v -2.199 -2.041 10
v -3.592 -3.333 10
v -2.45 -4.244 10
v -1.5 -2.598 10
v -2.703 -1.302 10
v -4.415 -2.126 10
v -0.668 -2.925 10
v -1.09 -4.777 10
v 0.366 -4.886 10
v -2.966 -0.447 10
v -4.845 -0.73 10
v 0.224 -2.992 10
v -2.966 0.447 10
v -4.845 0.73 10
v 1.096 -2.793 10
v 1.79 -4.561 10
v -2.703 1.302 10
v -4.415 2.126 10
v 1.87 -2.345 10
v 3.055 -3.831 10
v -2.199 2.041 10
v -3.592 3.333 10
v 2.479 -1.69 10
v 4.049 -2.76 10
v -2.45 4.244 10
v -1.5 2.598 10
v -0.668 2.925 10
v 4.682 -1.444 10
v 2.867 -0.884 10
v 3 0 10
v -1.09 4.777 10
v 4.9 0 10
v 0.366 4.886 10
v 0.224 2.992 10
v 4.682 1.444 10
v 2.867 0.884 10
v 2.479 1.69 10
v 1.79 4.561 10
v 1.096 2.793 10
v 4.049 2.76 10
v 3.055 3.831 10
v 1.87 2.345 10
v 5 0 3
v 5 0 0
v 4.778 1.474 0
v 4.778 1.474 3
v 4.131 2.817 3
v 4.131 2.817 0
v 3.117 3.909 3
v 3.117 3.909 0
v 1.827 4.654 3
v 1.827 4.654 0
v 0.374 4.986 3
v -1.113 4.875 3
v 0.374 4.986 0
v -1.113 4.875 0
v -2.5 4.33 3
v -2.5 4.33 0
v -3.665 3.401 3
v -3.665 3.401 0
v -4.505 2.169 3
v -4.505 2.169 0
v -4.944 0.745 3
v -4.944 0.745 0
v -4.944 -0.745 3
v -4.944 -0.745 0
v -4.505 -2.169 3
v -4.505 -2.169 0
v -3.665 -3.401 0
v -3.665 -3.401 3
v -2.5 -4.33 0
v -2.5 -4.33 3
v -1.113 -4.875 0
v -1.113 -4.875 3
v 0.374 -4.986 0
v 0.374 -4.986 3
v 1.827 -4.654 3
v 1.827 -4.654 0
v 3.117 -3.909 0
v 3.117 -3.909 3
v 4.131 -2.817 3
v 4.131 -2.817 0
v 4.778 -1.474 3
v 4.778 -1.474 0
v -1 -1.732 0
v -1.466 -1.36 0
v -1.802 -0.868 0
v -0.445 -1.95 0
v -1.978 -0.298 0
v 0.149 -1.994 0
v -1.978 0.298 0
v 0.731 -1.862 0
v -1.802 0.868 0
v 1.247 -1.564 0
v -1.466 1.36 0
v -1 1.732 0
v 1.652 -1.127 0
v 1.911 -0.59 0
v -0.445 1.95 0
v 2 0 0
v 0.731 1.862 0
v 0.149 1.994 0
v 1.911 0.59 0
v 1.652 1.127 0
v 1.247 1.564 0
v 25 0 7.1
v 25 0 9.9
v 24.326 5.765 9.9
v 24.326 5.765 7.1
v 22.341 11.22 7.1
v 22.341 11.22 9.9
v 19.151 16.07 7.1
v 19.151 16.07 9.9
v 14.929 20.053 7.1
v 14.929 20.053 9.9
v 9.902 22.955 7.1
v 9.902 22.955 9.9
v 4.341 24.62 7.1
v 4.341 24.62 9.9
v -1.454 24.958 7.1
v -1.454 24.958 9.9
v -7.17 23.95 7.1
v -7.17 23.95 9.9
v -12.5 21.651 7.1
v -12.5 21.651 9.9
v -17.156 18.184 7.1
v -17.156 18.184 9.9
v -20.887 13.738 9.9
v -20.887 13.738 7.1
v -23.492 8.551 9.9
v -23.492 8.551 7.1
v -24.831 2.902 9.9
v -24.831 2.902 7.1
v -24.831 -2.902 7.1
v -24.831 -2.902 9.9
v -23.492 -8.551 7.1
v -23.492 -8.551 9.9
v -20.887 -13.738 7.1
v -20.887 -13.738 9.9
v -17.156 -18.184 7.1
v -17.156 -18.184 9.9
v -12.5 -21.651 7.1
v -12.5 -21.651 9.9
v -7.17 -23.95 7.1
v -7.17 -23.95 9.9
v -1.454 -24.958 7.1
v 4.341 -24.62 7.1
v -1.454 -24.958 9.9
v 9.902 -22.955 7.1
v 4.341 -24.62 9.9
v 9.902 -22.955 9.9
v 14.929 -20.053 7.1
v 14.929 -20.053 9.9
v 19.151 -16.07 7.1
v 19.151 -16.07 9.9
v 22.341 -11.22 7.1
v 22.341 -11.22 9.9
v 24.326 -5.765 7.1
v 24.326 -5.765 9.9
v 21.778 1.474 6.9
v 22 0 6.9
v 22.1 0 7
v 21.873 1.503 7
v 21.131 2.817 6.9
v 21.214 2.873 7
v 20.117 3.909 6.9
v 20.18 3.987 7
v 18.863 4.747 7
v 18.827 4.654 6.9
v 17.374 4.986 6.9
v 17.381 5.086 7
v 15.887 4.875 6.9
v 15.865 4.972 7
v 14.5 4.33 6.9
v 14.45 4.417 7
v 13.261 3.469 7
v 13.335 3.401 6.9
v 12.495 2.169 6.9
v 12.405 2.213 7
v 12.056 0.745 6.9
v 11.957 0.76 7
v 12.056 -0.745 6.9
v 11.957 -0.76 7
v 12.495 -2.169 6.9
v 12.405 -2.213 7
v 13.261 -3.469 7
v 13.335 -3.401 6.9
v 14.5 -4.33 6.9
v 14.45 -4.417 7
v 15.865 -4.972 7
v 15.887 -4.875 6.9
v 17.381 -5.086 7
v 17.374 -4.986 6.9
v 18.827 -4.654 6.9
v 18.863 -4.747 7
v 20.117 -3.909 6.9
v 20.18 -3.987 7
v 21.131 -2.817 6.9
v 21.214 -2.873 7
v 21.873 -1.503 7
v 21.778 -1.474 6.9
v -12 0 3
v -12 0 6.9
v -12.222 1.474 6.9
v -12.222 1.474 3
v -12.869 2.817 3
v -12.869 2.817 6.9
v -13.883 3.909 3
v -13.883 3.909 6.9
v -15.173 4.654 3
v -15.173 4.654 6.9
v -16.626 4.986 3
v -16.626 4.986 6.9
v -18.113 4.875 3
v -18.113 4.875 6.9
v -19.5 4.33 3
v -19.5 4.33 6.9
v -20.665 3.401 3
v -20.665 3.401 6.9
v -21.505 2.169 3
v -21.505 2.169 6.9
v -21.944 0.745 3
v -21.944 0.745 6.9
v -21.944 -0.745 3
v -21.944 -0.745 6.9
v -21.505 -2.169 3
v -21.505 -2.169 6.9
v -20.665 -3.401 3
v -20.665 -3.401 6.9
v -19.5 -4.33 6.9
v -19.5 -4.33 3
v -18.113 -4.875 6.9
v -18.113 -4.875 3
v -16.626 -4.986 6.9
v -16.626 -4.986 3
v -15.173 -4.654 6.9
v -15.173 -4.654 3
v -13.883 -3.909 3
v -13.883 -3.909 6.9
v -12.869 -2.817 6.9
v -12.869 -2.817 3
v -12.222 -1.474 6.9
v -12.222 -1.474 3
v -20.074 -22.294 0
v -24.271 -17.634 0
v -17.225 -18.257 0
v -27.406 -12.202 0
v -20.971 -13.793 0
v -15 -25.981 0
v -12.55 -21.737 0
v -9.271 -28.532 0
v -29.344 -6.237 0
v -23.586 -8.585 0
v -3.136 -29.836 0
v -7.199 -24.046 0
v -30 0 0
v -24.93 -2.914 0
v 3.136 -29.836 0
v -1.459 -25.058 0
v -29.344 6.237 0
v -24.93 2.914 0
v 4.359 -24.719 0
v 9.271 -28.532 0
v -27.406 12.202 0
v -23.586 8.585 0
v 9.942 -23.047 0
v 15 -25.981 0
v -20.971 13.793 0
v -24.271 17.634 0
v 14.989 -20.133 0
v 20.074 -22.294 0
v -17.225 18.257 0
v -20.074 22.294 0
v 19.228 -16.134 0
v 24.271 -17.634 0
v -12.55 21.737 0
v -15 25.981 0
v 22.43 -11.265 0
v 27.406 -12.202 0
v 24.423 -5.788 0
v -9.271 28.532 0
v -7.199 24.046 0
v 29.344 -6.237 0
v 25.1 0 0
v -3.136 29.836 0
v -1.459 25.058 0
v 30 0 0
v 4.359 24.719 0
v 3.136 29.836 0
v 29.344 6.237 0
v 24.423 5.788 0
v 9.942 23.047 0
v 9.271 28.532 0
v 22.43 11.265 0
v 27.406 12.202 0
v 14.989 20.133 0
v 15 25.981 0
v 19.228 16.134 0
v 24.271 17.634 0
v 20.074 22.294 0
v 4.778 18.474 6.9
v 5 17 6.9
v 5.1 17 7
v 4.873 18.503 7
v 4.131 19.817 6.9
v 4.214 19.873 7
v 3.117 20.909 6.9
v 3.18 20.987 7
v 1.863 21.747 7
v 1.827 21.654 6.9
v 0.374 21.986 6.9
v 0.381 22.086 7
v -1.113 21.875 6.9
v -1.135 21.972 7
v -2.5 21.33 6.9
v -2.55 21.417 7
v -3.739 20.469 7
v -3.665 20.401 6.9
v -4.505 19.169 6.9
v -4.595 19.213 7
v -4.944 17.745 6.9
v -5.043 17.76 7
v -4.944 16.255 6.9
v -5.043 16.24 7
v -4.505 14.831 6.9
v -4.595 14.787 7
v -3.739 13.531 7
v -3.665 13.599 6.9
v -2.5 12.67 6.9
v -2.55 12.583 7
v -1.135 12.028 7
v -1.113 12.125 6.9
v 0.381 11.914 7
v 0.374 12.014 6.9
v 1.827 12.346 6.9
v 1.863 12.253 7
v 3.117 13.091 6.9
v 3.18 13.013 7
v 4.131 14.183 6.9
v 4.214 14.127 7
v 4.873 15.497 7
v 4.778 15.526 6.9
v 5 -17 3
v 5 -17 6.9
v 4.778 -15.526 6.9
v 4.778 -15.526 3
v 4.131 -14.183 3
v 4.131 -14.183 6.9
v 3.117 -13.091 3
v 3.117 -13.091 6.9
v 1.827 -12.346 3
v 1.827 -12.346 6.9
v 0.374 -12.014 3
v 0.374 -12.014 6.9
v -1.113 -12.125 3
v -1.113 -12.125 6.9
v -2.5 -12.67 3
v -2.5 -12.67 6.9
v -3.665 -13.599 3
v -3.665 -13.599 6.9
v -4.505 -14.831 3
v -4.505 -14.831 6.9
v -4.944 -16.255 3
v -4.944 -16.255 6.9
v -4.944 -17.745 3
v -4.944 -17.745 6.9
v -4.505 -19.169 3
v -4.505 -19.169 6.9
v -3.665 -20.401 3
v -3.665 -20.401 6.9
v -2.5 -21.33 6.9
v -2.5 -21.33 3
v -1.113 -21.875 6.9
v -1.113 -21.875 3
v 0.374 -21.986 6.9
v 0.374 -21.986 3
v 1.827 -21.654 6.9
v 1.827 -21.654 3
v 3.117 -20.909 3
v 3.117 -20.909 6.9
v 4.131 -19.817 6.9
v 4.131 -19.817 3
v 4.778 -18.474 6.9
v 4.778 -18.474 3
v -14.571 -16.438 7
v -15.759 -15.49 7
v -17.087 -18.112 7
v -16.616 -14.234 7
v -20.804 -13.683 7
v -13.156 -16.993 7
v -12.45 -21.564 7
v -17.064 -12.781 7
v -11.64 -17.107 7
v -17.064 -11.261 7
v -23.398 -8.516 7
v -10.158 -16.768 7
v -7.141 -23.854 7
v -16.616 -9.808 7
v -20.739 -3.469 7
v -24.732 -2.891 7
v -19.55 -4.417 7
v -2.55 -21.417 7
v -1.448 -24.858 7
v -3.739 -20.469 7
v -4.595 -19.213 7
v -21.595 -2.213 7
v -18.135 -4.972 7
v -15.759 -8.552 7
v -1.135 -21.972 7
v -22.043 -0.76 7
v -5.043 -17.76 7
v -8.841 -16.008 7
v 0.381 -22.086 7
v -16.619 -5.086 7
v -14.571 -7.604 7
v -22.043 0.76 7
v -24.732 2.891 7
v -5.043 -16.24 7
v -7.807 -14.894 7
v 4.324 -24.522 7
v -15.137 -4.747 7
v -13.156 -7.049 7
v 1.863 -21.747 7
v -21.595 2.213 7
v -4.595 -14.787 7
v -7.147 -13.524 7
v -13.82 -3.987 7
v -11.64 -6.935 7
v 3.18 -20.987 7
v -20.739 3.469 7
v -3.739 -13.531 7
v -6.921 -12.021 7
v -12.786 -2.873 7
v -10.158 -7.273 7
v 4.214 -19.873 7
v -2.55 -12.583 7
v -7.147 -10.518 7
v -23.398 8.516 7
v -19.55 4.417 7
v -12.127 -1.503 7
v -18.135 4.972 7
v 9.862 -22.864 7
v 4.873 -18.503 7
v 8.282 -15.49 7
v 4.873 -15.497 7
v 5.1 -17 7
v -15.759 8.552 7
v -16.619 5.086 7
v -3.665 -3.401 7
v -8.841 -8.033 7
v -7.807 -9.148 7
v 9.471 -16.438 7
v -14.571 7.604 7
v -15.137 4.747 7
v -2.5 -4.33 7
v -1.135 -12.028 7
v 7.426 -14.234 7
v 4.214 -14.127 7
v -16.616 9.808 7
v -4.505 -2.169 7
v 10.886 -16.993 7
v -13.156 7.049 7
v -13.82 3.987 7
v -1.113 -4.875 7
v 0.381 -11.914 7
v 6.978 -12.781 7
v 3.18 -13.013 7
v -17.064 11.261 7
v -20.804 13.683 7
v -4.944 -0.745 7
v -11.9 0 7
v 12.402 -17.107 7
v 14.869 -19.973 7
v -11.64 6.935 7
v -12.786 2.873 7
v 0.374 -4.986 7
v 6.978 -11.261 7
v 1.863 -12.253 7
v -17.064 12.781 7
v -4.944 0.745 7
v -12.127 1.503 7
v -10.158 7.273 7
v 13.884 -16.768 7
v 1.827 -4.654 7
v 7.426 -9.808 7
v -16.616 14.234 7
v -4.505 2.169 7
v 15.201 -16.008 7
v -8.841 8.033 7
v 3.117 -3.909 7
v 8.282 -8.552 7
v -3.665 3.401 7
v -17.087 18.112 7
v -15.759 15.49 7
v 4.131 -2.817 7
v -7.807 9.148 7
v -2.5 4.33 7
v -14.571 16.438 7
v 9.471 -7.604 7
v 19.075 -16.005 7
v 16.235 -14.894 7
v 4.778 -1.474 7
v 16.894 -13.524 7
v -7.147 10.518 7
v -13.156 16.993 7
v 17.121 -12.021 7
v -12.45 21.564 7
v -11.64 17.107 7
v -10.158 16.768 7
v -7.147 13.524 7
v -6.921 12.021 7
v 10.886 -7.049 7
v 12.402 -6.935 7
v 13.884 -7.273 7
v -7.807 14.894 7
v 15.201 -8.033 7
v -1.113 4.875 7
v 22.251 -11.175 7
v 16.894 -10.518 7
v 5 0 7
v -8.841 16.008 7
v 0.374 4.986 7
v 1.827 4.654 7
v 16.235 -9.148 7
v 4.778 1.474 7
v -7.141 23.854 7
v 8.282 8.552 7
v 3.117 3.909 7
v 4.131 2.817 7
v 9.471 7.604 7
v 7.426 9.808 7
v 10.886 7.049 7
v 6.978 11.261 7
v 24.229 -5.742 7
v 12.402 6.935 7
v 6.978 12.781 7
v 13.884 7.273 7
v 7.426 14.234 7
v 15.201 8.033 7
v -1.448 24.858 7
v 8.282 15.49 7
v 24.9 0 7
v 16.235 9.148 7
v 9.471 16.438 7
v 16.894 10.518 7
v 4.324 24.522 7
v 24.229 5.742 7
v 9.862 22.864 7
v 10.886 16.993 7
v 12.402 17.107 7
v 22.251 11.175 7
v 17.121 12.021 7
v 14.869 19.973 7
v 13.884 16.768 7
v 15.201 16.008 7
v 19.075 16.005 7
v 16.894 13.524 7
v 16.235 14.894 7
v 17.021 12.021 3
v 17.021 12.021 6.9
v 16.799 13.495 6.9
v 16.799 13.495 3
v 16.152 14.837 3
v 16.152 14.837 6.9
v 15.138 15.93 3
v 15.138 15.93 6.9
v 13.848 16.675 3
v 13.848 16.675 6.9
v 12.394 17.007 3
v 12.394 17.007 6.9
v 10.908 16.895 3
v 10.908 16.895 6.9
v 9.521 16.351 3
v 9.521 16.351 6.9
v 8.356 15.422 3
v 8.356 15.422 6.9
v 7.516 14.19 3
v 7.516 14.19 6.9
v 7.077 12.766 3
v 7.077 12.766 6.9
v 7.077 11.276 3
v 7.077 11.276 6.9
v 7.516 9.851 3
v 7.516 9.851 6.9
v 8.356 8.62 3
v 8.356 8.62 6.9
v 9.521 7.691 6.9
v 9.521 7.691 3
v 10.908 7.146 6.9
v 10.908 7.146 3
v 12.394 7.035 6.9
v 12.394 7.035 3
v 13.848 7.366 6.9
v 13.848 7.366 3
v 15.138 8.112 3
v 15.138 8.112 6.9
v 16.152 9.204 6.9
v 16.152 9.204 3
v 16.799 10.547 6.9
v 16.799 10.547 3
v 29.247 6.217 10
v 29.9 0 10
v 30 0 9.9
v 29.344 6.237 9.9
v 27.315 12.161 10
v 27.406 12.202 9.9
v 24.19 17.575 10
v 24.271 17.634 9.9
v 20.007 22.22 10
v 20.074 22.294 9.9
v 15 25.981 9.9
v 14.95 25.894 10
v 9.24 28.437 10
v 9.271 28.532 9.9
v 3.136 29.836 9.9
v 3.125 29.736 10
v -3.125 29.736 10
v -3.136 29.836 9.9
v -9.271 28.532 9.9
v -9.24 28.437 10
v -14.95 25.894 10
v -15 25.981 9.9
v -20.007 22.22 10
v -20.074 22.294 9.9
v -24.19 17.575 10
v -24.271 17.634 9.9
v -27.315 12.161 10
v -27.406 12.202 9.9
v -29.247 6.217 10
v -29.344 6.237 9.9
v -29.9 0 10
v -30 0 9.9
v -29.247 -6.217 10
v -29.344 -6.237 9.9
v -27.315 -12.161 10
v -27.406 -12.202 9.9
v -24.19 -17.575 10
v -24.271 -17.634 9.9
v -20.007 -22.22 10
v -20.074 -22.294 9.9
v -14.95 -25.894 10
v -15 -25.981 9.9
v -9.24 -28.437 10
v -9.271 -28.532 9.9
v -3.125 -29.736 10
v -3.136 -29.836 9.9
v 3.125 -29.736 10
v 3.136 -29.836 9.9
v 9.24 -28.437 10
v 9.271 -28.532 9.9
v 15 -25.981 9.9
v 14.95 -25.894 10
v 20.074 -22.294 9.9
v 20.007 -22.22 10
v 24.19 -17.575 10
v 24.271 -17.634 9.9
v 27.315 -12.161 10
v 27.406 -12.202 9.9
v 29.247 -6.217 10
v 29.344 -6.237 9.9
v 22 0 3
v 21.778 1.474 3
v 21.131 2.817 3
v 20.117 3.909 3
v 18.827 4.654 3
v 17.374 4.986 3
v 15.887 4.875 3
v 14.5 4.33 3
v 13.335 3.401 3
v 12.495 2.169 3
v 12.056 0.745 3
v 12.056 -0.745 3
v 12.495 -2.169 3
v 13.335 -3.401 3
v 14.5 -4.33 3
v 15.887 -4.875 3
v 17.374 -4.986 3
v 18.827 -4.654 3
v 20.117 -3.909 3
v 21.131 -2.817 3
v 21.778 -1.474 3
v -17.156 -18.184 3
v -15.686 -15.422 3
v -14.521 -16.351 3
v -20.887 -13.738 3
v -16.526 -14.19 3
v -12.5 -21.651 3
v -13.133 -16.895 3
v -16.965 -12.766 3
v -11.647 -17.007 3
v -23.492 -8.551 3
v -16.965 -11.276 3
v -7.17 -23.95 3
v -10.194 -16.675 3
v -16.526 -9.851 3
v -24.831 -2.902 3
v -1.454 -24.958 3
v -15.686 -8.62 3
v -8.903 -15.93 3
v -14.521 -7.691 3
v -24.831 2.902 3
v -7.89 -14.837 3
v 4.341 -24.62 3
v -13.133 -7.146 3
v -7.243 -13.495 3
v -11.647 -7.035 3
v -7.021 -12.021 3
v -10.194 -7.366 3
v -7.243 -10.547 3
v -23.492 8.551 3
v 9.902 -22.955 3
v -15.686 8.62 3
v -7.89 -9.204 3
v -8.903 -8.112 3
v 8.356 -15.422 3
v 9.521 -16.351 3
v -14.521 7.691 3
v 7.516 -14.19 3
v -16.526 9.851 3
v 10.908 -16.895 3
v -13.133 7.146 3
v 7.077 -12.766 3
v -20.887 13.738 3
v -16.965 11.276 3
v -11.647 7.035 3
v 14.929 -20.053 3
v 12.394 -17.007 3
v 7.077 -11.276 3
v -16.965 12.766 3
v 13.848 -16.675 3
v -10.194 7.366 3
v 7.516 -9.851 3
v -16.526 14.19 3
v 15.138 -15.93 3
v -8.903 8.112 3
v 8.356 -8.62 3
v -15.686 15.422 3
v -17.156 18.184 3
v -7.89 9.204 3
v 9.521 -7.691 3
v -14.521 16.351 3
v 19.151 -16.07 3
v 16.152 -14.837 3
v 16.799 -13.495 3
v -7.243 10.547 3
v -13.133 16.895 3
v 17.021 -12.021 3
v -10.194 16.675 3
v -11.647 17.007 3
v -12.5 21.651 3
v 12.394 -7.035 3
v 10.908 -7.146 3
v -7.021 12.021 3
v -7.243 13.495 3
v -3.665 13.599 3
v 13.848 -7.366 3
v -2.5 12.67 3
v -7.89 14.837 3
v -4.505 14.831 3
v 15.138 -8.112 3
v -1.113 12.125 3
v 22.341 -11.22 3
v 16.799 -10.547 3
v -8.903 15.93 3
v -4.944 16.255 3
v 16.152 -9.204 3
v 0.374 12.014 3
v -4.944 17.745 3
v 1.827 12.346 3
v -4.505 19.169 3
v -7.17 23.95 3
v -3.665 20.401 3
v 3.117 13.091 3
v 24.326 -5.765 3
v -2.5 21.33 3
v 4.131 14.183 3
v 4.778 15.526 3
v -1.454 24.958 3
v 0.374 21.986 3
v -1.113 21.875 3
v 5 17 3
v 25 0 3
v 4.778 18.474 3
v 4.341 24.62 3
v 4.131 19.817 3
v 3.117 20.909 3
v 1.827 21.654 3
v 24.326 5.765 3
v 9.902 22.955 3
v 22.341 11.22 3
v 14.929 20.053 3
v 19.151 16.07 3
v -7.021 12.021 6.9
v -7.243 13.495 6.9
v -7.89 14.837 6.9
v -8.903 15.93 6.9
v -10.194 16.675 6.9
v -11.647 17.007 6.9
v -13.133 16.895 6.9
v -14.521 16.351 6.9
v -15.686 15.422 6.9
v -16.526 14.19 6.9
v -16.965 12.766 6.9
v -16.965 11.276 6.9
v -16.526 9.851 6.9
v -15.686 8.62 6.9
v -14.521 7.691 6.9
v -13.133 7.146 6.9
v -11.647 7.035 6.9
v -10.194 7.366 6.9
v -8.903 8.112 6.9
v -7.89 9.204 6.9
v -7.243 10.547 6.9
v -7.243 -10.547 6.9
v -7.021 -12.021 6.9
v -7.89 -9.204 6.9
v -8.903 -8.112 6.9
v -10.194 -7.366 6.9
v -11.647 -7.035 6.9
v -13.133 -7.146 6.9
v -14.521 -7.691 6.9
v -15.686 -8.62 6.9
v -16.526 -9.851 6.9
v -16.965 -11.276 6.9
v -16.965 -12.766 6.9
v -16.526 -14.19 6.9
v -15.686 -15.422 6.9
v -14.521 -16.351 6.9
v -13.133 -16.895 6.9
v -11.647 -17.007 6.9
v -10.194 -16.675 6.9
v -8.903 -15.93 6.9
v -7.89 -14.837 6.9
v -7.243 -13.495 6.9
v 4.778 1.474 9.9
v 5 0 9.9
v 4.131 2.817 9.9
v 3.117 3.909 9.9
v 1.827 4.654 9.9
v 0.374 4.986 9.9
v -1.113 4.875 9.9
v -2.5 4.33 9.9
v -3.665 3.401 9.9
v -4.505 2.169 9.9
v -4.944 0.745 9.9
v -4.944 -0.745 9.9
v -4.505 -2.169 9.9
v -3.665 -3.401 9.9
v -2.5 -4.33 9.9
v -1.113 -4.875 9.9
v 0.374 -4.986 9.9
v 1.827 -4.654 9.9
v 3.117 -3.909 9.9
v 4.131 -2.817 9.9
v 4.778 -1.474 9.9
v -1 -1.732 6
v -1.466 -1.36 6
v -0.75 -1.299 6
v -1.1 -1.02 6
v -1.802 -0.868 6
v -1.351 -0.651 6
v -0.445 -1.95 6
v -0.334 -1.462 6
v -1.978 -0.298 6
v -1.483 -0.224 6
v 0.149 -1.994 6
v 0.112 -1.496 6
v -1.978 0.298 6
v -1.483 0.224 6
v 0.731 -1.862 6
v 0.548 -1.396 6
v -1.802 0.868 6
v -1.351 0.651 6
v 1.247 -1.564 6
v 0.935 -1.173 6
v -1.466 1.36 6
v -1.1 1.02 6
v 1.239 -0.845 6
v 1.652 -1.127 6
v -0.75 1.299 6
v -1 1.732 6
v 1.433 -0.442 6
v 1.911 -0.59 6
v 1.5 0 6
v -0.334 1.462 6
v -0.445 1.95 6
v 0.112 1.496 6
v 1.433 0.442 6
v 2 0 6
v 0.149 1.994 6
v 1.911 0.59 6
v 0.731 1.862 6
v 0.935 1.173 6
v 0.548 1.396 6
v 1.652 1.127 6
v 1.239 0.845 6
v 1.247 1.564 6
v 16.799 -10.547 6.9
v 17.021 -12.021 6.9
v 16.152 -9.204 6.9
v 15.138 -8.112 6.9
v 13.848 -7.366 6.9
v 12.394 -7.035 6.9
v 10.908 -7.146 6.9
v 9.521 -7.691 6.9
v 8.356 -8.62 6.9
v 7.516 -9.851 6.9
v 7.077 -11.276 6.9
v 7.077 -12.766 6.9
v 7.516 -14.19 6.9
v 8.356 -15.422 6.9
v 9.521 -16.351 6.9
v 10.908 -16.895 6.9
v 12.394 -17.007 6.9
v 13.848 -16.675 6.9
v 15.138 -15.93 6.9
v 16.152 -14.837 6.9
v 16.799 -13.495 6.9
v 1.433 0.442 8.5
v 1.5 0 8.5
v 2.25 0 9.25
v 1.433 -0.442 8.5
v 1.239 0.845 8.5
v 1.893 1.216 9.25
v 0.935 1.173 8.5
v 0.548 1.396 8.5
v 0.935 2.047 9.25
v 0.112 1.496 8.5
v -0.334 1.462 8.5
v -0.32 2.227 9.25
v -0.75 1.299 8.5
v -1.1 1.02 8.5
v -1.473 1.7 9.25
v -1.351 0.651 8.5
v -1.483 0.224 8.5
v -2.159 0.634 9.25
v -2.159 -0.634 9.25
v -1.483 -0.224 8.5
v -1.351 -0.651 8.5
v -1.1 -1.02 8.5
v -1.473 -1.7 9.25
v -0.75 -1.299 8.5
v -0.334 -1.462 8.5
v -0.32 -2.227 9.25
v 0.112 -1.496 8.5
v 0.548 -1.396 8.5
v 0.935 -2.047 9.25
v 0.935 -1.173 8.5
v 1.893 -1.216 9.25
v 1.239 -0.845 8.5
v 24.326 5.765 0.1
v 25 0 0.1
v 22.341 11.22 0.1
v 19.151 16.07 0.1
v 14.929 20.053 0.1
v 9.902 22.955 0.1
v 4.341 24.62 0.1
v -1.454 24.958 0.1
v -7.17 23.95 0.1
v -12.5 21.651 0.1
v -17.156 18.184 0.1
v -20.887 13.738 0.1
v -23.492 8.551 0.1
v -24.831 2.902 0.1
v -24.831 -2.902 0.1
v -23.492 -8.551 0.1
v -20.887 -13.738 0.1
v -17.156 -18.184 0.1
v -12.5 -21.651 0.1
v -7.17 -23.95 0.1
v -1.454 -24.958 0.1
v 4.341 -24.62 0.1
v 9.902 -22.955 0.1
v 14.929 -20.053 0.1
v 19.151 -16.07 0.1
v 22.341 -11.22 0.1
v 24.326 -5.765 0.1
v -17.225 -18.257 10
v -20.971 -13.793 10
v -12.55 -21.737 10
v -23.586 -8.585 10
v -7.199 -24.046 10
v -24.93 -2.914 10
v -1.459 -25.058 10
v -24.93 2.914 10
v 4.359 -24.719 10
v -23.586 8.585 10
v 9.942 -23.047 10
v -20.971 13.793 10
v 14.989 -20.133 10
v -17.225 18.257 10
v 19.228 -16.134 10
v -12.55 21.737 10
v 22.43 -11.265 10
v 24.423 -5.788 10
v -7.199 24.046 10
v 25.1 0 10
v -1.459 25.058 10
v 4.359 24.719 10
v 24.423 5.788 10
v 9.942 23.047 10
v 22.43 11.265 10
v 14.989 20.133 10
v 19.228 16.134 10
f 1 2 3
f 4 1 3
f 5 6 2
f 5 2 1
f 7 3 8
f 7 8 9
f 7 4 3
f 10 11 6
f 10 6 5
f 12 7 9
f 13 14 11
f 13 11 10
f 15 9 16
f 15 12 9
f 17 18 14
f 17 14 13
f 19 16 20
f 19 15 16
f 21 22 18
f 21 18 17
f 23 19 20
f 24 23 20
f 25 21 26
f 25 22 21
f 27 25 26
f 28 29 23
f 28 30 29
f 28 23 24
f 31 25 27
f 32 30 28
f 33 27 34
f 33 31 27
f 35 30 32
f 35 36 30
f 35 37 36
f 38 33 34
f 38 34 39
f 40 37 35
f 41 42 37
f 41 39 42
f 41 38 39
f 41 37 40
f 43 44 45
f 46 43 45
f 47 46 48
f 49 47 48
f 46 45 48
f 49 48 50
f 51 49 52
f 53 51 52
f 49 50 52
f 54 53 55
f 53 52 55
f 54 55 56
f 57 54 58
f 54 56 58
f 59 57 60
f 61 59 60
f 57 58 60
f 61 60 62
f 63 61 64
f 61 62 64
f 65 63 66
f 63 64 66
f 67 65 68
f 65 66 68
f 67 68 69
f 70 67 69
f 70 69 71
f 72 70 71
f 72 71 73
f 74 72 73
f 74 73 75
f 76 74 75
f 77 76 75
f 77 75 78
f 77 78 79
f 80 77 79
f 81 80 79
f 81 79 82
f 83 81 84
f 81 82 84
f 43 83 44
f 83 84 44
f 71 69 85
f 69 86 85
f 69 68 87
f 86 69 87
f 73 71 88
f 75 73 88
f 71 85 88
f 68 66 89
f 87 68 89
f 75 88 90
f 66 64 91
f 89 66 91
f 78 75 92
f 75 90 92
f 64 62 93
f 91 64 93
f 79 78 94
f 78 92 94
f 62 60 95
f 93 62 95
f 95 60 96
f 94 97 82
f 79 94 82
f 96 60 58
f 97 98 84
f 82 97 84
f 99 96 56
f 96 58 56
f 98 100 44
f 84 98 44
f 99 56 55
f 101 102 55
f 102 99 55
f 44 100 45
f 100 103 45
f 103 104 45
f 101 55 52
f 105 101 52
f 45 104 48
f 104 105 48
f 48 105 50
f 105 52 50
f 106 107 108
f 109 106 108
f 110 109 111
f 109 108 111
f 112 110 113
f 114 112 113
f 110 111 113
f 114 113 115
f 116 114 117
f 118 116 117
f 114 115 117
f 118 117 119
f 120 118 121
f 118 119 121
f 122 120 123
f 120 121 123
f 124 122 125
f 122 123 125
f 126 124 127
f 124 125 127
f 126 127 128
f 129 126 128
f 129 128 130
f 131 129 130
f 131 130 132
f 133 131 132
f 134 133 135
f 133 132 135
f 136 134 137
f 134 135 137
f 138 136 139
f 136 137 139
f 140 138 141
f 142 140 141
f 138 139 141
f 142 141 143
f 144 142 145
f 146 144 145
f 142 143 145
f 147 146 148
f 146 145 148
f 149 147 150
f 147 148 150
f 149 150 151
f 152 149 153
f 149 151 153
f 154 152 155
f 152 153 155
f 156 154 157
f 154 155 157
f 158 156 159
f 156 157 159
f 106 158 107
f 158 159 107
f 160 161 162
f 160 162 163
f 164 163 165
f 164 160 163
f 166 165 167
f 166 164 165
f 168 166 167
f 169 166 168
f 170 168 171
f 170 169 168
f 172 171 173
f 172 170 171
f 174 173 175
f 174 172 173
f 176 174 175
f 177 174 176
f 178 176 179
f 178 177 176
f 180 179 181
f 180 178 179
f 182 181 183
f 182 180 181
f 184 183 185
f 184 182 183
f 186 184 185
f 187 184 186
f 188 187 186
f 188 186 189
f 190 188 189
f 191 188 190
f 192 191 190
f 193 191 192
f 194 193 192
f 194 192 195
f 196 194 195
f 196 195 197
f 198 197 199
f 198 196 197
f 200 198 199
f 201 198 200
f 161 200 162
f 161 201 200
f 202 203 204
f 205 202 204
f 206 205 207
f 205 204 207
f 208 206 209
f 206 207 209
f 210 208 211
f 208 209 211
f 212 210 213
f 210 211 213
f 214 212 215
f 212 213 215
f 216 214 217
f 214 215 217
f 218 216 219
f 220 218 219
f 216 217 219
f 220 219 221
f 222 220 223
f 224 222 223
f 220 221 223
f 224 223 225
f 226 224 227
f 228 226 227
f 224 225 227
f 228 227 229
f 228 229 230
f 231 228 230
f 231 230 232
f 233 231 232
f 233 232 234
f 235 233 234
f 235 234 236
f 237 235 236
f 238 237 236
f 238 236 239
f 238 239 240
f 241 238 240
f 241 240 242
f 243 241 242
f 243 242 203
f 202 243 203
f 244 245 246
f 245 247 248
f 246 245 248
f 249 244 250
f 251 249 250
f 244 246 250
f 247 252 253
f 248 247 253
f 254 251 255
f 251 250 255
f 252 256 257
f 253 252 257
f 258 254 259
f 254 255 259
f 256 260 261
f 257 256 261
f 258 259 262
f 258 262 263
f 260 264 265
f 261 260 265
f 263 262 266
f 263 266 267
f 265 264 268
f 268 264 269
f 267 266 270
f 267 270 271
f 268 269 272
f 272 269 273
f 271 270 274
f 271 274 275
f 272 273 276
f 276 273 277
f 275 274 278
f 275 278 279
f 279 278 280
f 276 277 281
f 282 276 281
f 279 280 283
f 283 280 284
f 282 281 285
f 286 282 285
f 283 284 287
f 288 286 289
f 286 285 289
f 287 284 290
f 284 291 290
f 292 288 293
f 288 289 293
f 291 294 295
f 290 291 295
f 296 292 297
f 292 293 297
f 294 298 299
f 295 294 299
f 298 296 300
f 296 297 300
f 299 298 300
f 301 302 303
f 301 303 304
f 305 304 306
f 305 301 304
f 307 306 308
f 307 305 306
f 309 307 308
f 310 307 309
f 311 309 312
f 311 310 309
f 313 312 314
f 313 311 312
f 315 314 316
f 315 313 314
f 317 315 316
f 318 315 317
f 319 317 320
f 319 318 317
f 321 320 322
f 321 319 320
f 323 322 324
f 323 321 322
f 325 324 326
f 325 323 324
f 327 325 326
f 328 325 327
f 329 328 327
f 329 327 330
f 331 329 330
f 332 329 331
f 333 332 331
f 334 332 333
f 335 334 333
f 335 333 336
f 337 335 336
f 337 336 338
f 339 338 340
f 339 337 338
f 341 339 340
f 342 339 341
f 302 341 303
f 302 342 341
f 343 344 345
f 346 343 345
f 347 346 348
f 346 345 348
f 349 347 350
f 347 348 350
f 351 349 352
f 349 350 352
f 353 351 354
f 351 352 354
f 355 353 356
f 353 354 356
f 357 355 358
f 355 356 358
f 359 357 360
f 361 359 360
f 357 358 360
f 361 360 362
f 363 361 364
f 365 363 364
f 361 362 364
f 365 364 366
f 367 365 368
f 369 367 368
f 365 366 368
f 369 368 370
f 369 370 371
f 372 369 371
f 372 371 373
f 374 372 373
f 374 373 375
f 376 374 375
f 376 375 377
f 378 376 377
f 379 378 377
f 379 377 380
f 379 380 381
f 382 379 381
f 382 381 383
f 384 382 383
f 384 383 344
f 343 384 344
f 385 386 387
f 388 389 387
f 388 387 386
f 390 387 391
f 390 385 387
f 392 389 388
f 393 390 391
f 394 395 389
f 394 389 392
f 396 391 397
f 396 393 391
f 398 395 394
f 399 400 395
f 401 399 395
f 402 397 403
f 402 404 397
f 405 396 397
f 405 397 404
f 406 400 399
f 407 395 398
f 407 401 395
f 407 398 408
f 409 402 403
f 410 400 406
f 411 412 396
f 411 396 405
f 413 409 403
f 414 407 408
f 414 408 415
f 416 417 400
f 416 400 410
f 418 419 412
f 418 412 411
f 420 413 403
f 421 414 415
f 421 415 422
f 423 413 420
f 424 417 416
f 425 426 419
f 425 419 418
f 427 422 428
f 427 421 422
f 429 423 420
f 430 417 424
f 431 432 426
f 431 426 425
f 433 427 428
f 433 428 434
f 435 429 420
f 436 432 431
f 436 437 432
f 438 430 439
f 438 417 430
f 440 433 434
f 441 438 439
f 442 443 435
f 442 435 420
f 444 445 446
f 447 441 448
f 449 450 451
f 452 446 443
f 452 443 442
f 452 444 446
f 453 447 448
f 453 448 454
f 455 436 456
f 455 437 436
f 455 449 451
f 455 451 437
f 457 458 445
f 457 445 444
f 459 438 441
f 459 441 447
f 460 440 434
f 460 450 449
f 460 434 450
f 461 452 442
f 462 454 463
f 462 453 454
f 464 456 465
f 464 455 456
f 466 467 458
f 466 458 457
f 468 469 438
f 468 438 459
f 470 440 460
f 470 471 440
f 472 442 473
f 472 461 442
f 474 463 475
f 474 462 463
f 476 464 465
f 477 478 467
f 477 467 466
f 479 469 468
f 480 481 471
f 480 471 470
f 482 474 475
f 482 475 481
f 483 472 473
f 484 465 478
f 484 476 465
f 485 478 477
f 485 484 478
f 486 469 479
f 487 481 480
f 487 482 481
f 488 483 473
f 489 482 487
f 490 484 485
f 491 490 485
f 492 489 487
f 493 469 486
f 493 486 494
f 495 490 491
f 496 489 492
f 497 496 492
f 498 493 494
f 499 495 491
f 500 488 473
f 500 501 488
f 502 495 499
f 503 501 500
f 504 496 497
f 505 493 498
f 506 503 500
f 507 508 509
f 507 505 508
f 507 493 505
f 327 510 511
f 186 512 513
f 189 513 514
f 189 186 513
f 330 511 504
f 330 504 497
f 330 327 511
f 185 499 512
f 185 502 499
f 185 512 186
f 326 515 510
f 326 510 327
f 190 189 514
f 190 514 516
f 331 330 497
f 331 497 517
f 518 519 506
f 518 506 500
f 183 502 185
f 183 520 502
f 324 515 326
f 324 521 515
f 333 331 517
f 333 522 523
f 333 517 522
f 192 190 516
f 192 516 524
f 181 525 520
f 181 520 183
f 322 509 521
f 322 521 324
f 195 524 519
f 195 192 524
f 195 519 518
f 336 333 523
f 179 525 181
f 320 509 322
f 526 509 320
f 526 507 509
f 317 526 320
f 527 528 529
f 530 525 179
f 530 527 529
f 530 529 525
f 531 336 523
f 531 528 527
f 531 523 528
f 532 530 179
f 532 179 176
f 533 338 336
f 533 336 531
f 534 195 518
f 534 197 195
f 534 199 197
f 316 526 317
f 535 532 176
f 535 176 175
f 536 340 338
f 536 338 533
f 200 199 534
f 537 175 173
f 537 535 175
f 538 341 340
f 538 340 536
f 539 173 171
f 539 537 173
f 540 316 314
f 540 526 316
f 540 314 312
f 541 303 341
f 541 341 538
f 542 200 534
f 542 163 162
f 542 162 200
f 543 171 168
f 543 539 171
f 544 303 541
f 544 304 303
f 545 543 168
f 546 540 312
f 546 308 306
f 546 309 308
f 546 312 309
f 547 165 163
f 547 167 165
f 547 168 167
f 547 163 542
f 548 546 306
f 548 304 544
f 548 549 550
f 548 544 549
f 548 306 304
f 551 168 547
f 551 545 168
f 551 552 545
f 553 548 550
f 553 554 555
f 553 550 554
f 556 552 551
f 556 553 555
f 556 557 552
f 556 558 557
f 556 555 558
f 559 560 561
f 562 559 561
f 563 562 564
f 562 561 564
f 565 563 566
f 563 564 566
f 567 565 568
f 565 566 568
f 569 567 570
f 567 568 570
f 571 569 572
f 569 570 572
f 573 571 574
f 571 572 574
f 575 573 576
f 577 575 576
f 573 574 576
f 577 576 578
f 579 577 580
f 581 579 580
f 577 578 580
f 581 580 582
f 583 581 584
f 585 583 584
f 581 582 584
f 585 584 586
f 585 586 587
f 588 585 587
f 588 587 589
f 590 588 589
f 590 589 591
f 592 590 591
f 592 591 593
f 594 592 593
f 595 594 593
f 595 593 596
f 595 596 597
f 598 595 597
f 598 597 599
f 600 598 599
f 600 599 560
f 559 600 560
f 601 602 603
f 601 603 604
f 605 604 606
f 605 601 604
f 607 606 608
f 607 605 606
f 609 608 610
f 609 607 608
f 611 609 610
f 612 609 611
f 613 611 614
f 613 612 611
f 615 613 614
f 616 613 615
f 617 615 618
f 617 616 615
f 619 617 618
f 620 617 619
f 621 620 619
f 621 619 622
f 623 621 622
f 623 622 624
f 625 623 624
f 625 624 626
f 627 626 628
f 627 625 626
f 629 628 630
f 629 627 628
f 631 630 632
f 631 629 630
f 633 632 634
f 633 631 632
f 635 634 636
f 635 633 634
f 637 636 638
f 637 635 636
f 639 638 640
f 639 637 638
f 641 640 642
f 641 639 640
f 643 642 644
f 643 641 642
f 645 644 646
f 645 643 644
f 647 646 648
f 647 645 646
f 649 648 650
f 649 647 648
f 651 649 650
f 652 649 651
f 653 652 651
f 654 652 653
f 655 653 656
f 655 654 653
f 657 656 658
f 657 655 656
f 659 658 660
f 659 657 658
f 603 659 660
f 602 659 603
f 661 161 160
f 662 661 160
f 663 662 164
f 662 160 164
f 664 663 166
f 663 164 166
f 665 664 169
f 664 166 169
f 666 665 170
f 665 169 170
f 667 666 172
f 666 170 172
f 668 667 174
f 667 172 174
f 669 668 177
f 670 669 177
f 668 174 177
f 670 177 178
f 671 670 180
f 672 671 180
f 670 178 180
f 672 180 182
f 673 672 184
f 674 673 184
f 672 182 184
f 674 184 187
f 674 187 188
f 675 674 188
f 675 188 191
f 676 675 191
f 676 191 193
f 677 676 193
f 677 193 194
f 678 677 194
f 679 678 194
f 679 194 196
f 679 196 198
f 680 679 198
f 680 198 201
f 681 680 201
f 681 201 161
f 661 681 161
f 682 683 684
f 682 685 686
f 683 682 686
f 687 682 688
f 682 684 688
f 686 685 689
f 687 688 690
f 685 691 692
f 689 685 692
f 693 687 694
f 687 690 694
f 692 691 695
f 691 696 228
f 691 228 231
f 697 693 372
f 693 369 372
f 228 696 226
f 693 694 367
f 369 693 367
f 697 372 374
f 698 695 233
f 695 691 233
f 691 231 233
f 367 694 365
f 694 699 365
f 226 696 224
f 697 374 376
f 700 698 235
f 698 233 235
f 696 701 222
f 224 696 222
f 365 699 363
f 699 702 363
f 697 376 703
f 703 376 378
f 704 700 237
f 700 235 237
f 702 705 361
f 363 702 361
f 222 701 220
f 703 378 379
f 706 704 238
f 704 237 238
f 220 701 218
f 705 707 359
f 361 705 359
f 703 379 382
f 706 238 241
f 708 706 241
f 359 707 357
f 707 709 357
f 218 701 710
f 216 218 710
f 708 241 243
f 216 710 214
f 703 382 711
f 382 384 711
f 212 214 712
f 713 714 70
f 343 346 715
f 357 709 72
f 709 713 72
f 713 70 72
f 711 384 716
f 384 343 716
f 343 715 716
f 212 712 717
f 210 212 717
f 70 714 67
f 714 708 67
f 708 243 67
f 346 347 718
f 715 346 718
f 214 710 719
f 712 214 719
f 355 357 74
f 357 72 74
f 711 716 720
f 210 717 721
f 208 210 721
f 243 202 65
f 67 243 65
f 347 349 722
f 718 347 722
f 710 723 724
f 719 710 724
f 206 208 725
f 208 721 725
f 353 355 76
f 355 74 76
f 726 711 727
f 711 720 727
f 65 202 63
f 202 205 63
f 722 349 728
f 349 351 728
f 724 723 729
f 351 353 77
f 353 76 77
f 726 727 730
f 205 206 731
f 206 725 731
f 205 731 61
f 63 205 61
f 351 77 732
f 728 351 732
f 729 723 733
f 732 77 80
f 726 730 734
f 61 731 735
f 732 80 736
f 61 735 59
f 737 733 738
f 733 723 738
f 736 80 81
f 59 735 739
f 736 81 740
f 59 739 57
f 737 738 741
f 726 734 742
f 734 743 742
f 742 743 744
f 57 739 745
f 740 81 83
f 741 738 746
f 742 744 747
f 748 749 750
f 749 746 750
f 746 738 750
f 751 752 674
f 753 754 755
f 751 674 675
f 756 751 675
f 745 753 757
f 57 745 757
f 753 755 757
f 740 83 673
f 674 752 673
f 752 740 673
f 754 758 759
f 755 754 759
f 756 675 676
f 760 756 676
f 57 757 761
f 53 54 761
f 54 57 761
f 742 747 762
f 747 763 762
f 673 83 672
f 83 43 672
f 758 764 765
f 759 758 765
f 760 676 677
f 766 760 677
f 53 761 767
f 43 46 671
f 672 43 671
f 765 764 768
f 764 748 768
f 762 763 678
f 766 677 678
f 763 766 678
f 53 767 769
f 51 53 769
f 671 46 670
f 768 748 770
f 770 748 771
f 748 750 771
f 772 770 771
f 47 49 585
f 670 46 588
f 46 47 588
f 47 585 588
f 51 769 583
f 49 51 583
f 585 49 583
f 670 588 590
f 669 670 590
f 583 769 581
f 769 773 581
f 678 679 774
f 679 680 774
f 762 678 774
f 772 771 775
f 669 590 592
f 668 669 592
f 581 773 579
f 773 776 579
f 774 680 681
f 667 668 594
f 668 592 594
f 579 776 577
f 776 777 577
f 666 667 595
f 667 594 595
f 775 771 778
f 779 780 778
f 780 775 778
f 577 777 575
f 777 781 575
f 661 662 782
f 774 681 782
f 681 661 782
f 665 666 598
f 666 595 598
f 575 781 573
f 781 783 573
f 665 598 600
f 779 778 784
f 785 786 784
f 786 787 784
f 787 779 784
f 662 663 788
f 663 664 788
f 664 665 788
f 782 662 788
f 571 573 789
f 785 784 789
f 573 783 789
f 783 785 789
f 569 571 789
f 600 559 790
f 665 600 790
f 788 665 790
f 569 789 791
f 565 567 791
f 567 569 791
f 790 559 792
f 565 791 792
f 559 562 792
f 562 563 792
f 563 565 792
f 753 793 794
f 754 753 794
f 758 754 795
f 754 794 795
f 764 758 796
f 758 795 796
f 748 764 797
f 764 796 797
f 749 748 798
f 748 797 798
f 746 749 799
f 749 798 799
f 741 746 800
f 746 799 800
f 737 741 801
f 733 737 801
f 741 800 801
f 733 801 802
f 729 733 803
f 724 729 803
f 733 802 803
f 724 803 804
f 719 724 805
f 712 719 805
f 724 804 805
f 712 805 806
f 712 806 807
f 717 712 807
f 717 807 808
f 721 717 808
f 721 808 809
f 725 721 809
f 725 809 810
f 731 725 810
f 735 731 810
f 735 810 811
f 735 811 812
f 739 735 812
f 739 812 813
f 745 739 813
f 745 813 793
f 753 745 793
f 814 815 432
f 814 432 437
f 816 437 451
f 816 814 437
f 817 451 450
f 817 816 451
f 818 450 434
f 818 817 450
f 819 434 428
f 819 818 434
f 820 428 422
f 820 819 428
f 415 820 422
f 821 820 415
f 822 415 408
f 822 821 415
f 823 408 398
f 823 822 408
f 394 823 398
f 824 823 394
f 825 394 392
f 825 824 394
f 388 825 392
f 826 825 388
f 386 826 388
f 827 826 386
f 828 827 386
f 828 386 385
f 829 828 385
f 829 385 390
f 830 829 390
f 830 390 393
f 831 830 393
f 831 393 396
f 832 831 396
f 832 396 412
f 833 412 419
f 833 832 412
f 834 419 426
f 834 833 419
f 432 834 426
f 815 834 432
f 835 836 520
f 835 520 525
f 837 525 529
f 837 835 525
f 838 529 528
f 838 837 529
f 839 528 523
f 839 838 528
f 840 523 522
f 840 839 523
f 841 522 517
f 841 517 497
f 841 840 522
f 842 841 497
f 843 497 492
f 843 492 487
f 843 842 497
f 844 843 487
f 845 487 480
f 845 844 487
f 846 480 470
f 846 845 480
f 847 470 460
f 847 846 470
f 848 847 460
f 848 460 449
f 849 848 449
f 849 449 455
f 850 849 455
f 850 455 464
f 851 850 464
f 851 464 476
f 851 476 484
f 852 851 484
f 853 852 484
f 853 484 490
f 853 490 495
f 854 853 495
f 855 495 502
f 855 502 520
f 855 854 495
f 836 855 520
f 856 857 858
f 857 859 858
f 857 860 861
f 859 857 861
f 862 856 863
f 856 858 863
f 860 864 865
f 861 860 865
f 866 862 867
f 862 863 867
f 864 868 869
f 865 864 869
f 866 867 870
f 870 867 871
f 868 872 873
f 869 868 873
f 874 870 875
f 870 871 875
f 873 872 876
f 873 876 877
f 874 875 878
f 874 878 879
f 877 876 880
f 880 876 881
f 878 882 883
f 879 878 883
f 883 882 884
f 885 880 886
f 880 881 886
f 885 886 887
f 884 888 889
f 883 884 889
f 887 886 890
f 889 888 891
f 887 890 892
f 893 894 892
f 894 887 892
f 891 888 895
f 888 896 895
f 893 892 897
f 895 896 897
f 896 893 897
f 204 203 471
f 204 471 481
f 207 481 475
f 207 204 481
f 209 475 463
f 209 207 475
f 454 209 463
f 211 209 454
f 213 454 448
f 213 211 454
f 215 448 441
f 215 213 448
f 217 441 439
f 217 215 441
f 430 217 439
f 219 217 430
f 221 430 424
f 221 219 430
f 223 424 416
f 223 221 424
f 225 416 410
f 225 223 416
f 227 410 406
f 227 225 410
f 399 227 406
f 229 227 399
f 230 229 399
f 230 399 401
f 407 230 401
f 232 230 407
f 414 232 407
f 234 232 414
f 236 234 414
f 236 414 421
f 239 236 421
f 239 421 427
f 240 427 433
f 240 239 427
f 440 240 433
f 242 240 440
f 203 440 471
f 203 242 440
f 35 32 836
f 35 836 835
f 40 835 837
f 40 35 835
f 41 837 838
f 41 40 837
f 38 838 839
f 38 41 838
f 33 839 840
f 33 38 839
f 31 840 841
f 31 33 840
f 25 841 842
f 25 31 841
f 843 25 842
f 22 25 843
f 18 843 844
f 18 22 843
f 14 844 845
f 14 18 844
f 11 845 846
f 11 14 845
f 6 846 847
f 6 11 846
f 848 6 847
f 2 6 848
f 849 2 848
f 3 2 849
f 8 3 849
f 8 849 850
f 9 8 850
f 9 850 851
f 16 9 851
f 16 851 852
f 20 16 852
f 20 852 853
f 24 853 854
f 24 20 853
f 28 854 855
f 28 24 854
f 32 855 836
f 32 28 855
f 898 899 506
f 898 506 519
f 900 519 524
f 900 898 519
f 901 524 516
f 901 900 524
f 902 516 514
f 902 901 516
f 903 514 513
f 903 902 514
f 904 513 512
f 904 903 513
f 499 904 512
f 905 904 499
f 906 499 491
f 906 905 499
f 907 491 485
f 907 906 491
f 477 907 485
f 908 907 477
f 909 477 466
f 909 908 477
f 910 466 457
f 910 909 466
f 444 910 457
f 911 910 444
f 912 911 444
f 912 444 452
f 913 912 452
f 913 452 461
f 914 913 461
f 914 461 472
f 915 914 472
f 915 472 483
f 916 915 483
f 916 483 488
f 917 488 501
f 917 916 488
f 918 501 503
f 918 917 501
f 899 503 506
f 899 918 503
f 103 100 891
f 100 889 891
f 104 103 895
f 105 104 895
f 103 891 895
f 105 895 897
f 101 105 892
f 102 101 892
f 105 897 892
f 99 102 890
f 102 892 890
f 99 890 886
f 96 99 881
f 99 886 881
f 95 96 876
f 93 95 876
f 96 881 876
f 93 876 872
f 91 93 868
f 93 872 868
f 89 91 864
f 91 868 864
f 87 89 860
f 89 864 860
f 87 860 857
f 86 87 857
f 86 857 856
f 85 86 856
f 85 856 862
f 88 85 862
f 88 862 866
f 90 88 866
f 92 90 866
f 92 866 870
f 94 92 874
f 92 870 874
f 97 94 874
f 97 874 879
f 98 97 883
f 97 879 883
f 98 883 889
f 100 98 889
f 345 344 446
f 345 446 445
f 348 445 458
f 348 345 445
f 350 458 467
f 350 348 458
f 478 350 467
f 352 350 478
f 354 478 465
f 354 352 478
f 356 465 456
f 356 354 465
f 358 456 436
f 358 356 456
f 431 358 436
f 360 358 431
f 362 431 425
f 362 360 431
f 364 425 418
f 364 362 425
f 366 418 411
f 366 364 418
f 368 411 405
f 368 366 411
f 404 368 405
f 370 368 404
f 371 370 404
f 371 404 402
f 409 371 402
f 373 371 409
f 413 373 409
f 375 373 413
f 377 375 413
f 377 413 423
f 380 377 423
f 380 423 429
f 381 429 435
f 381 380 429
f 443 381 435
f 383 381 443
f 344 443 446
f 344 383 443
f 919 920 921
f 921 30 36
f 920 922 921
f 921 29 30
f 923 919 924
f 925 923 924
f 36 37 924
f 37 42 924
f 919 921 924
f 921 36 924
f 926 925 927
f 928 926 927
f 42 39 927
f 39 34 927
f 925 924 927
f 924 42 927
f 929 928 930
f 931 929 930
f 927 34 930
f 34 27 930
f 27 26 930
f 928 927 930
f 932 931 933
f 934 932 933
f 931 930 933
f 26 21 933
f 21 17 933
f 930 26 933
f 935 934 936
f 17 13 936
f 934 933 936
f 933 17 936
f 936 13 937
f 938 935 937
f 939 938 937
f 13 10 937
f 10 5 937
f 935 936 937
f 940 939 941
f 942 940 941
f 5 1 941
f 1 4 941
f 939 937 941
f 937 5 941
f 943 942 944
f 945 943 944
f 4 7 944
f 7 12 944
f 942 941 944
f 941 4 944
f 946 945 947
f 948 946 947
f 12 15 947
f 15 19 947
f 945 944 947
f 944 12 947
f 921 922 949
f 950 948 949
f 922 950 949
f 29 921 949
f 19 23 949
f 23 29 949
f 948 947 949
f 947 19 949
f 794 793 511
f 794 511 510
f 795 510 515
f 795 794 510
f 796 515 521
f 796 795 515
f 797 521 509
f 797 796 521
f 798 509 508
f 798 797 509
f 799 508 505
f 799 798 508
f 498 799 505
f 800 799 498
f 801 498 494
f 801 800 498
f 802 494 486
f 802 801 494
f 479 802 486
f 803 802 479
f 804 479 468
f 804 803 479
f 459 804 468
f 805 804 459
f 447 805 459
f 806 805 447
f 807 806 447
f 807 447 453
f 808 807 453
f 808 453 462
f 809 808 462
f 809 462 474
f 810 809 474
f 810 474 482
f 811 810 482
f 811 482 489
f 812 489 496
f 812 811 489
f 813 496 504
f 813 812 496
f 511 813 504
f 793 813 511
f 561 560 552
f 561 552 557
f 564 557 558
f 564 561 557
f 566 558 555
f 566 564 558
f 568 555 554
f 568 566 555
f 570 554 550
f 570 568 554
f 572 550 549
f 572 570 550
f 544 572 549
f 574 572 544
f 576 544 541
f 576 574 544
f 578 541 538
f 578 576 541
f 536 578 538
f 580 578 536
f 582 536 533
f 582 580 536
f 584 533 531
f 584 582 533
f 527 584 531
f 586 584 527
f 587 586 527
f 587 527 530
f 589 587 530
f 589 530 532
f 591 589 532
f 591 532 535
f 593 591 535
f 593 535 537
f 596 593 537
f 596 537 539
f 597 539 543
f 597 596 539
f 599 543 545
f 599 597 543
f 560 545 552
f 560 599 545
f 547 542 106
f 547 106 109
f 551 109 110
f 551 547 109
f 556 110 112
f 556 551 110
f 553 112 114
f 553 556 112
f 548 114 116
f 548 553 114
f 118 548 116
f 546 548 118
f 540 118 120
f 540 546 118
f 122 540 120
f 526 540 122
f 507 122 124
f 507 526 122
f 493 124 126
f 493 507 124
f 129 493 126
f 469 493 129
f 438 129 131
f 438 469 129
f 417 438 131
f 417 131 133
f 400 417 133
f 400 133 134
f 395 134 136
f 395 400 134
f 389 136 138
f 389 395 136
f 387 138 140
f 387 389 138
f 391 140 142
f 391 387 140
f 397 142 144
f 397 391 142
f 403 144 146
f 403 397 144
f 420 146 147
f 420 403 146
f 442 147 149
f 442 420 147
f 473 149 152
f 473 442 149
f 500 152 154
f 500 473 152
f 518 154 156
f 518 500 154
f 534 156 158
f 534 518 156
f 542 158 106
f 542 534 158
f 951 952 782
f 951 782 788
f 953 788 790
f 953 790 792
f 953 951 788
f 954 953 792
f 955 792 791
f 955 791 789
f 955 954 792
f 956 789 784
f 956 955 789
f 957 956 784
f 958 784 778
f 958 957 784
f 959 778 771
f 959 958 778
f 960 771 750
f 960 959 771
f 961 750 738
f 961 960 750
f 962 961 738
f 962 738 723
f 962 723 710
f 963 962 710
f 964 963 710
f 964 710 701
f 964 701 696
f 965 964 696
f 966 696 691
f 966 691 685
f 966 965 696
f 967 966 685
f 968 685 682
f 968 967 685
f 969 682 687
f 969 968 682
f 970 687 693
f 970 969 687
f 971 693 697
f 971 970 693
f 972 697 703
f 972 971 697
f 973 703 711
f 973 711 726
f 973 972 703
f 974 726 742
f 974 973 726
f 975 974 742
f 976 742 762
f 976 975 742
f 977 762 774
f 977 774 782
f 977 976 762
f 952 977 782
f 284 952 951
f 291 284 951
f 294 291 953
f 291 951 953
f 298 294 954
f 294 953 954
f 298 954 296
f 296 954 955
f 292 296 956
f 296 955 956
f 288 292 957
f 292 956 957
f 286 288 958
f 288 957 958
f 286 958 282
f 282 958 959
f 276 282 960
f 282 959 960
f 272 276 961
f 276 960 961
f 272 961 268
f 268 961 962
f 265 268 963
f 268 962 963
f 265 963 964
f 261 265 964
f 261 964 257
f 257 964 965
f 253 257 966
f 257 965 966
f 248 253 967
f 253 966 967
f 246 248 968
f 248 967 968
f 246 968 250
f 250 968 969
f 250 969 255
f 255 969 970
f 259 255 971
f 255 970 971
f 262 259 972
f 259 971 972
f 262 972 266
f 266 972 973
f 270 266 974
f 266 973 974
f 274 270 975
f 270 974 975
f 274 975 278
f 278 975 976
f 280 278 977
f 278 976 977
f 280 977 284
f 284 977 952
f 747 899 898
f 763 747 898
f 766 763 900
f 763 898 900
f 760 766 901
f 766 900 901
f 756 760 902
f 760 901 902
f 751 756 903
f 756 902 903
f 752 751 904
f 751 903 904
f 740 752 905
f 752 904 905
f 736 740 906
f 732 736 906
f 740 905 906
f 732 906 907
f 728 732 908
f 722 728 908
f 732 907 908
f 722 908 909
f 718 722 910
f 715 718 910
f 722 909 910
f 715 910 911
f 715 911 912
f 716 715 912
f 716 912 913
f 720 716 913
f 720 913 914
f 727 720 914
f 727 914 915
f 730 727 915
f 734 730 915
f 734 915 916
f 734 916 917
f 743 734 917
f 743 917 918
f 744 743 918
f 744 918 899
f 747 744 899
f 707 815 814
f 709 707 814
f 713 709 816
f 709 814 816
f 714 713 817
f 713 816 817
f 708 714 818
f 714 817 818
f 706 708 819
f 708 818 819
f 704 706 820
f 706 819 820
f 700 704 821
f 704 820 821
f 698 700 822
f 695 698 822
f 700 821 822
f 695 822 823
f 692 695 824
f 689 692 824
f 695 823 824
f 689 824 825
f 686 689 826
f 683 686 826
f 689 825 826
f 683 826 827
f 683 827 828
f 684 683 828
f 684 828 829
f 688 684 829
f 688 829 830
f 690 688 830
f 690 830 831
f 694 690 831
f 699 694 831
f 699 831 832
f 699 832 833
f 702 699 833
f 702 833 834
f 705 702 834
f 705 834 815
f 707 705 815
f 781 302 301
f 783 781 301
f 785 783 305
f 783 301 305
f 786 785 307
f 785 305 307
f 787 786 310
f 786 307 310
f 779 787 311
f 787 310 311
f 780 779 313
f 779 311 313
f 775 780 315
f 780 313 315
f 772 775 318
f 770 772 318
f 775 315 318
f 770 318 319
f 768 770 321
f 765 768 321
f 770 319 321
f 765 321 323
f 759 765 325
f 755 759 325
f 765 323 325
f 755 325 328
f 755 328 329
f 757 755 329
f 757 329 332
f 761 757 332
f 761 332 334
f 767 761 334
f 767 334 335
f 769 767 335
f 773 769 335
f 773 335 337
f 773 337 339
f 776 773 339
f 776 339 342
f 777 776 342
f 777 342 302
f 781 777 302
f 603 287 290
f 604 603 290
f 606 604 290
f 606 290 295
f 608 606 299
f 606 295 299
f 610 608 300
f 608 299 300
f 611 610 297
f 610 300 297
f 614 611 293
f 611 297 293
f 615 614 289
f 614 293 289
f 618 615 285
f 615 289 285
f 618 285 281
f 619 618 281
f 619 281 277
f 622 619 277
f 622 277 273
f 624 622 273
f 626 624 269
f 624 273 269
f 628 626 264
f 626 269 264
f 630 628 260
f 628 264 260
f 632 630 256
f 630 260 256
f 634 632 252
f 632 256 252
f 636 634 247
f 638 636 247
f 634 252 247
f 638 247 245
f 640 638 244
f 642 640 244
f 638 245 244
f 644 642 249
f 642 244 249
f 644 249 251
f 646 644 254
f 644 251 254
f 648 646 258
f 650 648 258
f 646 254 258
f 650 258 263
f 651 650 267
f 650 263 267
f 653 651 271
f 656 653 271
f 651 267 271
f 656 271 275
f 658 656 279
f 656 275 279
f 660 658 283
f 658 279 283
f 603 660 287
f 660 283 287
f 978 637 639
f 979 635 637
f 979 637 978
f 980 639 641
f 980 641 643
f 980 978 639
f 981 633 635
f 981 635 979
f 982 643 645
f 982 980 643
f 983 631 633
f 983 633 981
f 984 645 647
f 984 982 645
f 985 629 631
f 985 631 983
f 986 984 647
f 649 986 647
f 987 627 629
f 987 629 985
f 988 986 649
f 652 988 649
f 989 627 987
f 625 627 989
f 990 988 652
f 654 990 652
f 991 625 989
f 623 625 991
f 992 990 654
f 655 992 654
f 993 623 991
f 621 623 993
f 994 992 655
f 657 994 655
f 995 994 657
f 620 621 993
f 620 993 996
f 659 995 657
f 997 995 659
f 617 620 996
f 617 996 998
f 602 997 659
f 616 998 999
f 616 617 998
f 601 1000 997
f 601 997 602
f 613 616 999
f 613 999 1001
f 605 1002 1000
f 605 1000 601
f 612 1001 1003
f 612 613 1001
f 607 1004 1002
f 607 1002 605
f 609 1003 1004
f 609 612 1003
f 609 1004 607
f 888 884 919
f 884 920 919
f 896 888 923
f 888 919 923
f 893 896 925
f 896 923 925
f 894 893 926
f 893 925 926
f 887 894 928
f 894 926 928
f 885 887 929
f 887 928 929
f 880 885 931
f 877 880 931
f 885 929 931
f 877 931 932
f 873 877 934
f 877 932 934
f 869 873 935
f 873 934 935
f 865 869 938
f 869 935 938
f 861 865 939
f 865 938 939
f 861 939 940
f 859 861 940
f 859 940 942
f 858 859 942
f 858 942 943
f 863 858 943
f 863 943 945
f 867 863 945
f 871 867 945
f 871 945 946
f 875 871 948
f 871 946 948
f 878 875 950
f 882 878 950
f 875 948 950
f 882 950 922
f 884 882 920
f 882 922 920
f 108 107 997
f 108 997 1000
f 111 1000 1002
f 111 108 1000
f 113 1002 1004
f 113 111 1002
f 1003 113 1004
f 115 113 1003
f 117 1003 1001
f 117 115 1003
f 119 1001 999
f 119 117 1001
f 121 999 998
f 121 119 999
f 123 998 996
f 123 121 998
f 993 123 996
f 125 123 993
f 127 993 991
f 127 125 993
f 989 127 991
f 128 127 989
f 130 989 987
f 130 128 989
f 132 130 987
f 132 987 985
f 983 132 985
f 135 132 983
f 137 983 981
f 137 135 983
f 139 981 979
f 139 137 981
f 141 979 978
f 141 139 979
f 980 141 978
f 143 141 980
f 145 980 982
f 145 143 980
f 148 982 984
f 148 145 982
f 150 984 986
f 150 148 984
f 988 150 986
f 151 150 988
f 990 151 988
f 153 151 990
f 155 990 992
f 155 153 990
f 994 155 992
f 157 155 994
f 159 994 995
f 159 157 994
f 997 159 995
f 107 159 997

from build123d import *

# Parameters (mm, degrees)
SKETCH2_R           = 30
BOSS_EXTRUDE1_DEPTH = 10
SKETCH3_R           = 25
SKETCH3_R_2         = 5
CUT_EXTRUDE1_DEPTH  = 3
SKETCH4_R           = 5
CUT_EXTRUDE2_DEPTH  = 44
CHAMFER1_SIZE       = 0.1


# Read off the part's stored shape, not the designer's step: Cut-Revolve1
with BuildPart() as part:
    # Sketch2 → Boss-Extrude1 (new body)
    with BuildSketch(Plane.XY):
        Circle(SKETCH2_R)
    extrude(amount=BOSS_EXTRUDE1_DEPTH)

    # Sketch3 → Cut-Extrude1 (cut)
    with BuildSketch(Plane.XY.offset(10)):
        Circle(SKETCH3_R)
        Circle(SKETCH3_R_2, mode=Mode.SUBTRACT)
    cut_extrude1 = extrude(amount=-CUT_EXTRUDE1_DEPTH, mode=Mode.SUBTRACT)

    # Mirror2: Cut-Extrude1 across plane
    add(cut_extrude1.mirror(Plane.XY.offset(5)), mode=Mode.SUBTRACT)

    # Sketch4 → Cut-Extrude2 (cut, through all)
    with BuildSketch(Plane.XY.offset(7)):
        with Locations((0, 17)):
            Circle(SKETCH4_R)
        with Locations((12.02081528, 12.02081528)):
            Circle(SKETCH4_R)
        with Locations((17, 0)):
            Circle(SKETCH4_R)
        with Locations((12.02081528, -12.02081528)):
            Circle(SKETCH4_R)
        with Locations((0, -17)):
            Circle(SKETCH4_R)
        with Locations((-12.02081528, -12.02081528)):
            Circle(SKETCH4_R)
        with Locations((-17, 0)):
            Circle(SKETCH4_R)
        with Locations((-12.02081528, 12.02081528)):
            Circle(SKETCH4_R)
    extrude(amount=-CUT_EXTRUDE2_DEPTH, mode=Mode.SUBTRACT)

    # Chamfer1
    chamfer1_edges = [part.edges().sort_by_distance(p)[0] for p in [
        (-25, 0, 0),
        (-17.02081528, 12.02081528, 7),
        (-22, 0, 7),
        (-17.02081528, -12.02081528, 7),
        (-5, -17, 7),
        (7.02081528, -12.02081528, 7),
        (12, 0, 7),
        (7.02081528, 12.02081528, 7),
        (-5, 17, 7),
        (-30, 0, 10),
        (-25, 0, 7),
        (-25, 0, 10),
        (-5, 0, 10),
    ]]
    chamfer(chamfer1_edges, length=CHAMFER1_SIZE)

    # Cut-Revolve1 outline → Cut-Revolve1 (revolve, cut)
    with BuildSketch(Plane.XZ):
        Polygon((2, 0), (2, 6), (1.5, 6), (1.5, 8.5), (3, 10), (0, 10), (0, 0), align=None)
    revolve(axis=Axis((0, 0, 0), (0, 0, 1)), mode=Mode.SUBTRACT)


solid = part.part
